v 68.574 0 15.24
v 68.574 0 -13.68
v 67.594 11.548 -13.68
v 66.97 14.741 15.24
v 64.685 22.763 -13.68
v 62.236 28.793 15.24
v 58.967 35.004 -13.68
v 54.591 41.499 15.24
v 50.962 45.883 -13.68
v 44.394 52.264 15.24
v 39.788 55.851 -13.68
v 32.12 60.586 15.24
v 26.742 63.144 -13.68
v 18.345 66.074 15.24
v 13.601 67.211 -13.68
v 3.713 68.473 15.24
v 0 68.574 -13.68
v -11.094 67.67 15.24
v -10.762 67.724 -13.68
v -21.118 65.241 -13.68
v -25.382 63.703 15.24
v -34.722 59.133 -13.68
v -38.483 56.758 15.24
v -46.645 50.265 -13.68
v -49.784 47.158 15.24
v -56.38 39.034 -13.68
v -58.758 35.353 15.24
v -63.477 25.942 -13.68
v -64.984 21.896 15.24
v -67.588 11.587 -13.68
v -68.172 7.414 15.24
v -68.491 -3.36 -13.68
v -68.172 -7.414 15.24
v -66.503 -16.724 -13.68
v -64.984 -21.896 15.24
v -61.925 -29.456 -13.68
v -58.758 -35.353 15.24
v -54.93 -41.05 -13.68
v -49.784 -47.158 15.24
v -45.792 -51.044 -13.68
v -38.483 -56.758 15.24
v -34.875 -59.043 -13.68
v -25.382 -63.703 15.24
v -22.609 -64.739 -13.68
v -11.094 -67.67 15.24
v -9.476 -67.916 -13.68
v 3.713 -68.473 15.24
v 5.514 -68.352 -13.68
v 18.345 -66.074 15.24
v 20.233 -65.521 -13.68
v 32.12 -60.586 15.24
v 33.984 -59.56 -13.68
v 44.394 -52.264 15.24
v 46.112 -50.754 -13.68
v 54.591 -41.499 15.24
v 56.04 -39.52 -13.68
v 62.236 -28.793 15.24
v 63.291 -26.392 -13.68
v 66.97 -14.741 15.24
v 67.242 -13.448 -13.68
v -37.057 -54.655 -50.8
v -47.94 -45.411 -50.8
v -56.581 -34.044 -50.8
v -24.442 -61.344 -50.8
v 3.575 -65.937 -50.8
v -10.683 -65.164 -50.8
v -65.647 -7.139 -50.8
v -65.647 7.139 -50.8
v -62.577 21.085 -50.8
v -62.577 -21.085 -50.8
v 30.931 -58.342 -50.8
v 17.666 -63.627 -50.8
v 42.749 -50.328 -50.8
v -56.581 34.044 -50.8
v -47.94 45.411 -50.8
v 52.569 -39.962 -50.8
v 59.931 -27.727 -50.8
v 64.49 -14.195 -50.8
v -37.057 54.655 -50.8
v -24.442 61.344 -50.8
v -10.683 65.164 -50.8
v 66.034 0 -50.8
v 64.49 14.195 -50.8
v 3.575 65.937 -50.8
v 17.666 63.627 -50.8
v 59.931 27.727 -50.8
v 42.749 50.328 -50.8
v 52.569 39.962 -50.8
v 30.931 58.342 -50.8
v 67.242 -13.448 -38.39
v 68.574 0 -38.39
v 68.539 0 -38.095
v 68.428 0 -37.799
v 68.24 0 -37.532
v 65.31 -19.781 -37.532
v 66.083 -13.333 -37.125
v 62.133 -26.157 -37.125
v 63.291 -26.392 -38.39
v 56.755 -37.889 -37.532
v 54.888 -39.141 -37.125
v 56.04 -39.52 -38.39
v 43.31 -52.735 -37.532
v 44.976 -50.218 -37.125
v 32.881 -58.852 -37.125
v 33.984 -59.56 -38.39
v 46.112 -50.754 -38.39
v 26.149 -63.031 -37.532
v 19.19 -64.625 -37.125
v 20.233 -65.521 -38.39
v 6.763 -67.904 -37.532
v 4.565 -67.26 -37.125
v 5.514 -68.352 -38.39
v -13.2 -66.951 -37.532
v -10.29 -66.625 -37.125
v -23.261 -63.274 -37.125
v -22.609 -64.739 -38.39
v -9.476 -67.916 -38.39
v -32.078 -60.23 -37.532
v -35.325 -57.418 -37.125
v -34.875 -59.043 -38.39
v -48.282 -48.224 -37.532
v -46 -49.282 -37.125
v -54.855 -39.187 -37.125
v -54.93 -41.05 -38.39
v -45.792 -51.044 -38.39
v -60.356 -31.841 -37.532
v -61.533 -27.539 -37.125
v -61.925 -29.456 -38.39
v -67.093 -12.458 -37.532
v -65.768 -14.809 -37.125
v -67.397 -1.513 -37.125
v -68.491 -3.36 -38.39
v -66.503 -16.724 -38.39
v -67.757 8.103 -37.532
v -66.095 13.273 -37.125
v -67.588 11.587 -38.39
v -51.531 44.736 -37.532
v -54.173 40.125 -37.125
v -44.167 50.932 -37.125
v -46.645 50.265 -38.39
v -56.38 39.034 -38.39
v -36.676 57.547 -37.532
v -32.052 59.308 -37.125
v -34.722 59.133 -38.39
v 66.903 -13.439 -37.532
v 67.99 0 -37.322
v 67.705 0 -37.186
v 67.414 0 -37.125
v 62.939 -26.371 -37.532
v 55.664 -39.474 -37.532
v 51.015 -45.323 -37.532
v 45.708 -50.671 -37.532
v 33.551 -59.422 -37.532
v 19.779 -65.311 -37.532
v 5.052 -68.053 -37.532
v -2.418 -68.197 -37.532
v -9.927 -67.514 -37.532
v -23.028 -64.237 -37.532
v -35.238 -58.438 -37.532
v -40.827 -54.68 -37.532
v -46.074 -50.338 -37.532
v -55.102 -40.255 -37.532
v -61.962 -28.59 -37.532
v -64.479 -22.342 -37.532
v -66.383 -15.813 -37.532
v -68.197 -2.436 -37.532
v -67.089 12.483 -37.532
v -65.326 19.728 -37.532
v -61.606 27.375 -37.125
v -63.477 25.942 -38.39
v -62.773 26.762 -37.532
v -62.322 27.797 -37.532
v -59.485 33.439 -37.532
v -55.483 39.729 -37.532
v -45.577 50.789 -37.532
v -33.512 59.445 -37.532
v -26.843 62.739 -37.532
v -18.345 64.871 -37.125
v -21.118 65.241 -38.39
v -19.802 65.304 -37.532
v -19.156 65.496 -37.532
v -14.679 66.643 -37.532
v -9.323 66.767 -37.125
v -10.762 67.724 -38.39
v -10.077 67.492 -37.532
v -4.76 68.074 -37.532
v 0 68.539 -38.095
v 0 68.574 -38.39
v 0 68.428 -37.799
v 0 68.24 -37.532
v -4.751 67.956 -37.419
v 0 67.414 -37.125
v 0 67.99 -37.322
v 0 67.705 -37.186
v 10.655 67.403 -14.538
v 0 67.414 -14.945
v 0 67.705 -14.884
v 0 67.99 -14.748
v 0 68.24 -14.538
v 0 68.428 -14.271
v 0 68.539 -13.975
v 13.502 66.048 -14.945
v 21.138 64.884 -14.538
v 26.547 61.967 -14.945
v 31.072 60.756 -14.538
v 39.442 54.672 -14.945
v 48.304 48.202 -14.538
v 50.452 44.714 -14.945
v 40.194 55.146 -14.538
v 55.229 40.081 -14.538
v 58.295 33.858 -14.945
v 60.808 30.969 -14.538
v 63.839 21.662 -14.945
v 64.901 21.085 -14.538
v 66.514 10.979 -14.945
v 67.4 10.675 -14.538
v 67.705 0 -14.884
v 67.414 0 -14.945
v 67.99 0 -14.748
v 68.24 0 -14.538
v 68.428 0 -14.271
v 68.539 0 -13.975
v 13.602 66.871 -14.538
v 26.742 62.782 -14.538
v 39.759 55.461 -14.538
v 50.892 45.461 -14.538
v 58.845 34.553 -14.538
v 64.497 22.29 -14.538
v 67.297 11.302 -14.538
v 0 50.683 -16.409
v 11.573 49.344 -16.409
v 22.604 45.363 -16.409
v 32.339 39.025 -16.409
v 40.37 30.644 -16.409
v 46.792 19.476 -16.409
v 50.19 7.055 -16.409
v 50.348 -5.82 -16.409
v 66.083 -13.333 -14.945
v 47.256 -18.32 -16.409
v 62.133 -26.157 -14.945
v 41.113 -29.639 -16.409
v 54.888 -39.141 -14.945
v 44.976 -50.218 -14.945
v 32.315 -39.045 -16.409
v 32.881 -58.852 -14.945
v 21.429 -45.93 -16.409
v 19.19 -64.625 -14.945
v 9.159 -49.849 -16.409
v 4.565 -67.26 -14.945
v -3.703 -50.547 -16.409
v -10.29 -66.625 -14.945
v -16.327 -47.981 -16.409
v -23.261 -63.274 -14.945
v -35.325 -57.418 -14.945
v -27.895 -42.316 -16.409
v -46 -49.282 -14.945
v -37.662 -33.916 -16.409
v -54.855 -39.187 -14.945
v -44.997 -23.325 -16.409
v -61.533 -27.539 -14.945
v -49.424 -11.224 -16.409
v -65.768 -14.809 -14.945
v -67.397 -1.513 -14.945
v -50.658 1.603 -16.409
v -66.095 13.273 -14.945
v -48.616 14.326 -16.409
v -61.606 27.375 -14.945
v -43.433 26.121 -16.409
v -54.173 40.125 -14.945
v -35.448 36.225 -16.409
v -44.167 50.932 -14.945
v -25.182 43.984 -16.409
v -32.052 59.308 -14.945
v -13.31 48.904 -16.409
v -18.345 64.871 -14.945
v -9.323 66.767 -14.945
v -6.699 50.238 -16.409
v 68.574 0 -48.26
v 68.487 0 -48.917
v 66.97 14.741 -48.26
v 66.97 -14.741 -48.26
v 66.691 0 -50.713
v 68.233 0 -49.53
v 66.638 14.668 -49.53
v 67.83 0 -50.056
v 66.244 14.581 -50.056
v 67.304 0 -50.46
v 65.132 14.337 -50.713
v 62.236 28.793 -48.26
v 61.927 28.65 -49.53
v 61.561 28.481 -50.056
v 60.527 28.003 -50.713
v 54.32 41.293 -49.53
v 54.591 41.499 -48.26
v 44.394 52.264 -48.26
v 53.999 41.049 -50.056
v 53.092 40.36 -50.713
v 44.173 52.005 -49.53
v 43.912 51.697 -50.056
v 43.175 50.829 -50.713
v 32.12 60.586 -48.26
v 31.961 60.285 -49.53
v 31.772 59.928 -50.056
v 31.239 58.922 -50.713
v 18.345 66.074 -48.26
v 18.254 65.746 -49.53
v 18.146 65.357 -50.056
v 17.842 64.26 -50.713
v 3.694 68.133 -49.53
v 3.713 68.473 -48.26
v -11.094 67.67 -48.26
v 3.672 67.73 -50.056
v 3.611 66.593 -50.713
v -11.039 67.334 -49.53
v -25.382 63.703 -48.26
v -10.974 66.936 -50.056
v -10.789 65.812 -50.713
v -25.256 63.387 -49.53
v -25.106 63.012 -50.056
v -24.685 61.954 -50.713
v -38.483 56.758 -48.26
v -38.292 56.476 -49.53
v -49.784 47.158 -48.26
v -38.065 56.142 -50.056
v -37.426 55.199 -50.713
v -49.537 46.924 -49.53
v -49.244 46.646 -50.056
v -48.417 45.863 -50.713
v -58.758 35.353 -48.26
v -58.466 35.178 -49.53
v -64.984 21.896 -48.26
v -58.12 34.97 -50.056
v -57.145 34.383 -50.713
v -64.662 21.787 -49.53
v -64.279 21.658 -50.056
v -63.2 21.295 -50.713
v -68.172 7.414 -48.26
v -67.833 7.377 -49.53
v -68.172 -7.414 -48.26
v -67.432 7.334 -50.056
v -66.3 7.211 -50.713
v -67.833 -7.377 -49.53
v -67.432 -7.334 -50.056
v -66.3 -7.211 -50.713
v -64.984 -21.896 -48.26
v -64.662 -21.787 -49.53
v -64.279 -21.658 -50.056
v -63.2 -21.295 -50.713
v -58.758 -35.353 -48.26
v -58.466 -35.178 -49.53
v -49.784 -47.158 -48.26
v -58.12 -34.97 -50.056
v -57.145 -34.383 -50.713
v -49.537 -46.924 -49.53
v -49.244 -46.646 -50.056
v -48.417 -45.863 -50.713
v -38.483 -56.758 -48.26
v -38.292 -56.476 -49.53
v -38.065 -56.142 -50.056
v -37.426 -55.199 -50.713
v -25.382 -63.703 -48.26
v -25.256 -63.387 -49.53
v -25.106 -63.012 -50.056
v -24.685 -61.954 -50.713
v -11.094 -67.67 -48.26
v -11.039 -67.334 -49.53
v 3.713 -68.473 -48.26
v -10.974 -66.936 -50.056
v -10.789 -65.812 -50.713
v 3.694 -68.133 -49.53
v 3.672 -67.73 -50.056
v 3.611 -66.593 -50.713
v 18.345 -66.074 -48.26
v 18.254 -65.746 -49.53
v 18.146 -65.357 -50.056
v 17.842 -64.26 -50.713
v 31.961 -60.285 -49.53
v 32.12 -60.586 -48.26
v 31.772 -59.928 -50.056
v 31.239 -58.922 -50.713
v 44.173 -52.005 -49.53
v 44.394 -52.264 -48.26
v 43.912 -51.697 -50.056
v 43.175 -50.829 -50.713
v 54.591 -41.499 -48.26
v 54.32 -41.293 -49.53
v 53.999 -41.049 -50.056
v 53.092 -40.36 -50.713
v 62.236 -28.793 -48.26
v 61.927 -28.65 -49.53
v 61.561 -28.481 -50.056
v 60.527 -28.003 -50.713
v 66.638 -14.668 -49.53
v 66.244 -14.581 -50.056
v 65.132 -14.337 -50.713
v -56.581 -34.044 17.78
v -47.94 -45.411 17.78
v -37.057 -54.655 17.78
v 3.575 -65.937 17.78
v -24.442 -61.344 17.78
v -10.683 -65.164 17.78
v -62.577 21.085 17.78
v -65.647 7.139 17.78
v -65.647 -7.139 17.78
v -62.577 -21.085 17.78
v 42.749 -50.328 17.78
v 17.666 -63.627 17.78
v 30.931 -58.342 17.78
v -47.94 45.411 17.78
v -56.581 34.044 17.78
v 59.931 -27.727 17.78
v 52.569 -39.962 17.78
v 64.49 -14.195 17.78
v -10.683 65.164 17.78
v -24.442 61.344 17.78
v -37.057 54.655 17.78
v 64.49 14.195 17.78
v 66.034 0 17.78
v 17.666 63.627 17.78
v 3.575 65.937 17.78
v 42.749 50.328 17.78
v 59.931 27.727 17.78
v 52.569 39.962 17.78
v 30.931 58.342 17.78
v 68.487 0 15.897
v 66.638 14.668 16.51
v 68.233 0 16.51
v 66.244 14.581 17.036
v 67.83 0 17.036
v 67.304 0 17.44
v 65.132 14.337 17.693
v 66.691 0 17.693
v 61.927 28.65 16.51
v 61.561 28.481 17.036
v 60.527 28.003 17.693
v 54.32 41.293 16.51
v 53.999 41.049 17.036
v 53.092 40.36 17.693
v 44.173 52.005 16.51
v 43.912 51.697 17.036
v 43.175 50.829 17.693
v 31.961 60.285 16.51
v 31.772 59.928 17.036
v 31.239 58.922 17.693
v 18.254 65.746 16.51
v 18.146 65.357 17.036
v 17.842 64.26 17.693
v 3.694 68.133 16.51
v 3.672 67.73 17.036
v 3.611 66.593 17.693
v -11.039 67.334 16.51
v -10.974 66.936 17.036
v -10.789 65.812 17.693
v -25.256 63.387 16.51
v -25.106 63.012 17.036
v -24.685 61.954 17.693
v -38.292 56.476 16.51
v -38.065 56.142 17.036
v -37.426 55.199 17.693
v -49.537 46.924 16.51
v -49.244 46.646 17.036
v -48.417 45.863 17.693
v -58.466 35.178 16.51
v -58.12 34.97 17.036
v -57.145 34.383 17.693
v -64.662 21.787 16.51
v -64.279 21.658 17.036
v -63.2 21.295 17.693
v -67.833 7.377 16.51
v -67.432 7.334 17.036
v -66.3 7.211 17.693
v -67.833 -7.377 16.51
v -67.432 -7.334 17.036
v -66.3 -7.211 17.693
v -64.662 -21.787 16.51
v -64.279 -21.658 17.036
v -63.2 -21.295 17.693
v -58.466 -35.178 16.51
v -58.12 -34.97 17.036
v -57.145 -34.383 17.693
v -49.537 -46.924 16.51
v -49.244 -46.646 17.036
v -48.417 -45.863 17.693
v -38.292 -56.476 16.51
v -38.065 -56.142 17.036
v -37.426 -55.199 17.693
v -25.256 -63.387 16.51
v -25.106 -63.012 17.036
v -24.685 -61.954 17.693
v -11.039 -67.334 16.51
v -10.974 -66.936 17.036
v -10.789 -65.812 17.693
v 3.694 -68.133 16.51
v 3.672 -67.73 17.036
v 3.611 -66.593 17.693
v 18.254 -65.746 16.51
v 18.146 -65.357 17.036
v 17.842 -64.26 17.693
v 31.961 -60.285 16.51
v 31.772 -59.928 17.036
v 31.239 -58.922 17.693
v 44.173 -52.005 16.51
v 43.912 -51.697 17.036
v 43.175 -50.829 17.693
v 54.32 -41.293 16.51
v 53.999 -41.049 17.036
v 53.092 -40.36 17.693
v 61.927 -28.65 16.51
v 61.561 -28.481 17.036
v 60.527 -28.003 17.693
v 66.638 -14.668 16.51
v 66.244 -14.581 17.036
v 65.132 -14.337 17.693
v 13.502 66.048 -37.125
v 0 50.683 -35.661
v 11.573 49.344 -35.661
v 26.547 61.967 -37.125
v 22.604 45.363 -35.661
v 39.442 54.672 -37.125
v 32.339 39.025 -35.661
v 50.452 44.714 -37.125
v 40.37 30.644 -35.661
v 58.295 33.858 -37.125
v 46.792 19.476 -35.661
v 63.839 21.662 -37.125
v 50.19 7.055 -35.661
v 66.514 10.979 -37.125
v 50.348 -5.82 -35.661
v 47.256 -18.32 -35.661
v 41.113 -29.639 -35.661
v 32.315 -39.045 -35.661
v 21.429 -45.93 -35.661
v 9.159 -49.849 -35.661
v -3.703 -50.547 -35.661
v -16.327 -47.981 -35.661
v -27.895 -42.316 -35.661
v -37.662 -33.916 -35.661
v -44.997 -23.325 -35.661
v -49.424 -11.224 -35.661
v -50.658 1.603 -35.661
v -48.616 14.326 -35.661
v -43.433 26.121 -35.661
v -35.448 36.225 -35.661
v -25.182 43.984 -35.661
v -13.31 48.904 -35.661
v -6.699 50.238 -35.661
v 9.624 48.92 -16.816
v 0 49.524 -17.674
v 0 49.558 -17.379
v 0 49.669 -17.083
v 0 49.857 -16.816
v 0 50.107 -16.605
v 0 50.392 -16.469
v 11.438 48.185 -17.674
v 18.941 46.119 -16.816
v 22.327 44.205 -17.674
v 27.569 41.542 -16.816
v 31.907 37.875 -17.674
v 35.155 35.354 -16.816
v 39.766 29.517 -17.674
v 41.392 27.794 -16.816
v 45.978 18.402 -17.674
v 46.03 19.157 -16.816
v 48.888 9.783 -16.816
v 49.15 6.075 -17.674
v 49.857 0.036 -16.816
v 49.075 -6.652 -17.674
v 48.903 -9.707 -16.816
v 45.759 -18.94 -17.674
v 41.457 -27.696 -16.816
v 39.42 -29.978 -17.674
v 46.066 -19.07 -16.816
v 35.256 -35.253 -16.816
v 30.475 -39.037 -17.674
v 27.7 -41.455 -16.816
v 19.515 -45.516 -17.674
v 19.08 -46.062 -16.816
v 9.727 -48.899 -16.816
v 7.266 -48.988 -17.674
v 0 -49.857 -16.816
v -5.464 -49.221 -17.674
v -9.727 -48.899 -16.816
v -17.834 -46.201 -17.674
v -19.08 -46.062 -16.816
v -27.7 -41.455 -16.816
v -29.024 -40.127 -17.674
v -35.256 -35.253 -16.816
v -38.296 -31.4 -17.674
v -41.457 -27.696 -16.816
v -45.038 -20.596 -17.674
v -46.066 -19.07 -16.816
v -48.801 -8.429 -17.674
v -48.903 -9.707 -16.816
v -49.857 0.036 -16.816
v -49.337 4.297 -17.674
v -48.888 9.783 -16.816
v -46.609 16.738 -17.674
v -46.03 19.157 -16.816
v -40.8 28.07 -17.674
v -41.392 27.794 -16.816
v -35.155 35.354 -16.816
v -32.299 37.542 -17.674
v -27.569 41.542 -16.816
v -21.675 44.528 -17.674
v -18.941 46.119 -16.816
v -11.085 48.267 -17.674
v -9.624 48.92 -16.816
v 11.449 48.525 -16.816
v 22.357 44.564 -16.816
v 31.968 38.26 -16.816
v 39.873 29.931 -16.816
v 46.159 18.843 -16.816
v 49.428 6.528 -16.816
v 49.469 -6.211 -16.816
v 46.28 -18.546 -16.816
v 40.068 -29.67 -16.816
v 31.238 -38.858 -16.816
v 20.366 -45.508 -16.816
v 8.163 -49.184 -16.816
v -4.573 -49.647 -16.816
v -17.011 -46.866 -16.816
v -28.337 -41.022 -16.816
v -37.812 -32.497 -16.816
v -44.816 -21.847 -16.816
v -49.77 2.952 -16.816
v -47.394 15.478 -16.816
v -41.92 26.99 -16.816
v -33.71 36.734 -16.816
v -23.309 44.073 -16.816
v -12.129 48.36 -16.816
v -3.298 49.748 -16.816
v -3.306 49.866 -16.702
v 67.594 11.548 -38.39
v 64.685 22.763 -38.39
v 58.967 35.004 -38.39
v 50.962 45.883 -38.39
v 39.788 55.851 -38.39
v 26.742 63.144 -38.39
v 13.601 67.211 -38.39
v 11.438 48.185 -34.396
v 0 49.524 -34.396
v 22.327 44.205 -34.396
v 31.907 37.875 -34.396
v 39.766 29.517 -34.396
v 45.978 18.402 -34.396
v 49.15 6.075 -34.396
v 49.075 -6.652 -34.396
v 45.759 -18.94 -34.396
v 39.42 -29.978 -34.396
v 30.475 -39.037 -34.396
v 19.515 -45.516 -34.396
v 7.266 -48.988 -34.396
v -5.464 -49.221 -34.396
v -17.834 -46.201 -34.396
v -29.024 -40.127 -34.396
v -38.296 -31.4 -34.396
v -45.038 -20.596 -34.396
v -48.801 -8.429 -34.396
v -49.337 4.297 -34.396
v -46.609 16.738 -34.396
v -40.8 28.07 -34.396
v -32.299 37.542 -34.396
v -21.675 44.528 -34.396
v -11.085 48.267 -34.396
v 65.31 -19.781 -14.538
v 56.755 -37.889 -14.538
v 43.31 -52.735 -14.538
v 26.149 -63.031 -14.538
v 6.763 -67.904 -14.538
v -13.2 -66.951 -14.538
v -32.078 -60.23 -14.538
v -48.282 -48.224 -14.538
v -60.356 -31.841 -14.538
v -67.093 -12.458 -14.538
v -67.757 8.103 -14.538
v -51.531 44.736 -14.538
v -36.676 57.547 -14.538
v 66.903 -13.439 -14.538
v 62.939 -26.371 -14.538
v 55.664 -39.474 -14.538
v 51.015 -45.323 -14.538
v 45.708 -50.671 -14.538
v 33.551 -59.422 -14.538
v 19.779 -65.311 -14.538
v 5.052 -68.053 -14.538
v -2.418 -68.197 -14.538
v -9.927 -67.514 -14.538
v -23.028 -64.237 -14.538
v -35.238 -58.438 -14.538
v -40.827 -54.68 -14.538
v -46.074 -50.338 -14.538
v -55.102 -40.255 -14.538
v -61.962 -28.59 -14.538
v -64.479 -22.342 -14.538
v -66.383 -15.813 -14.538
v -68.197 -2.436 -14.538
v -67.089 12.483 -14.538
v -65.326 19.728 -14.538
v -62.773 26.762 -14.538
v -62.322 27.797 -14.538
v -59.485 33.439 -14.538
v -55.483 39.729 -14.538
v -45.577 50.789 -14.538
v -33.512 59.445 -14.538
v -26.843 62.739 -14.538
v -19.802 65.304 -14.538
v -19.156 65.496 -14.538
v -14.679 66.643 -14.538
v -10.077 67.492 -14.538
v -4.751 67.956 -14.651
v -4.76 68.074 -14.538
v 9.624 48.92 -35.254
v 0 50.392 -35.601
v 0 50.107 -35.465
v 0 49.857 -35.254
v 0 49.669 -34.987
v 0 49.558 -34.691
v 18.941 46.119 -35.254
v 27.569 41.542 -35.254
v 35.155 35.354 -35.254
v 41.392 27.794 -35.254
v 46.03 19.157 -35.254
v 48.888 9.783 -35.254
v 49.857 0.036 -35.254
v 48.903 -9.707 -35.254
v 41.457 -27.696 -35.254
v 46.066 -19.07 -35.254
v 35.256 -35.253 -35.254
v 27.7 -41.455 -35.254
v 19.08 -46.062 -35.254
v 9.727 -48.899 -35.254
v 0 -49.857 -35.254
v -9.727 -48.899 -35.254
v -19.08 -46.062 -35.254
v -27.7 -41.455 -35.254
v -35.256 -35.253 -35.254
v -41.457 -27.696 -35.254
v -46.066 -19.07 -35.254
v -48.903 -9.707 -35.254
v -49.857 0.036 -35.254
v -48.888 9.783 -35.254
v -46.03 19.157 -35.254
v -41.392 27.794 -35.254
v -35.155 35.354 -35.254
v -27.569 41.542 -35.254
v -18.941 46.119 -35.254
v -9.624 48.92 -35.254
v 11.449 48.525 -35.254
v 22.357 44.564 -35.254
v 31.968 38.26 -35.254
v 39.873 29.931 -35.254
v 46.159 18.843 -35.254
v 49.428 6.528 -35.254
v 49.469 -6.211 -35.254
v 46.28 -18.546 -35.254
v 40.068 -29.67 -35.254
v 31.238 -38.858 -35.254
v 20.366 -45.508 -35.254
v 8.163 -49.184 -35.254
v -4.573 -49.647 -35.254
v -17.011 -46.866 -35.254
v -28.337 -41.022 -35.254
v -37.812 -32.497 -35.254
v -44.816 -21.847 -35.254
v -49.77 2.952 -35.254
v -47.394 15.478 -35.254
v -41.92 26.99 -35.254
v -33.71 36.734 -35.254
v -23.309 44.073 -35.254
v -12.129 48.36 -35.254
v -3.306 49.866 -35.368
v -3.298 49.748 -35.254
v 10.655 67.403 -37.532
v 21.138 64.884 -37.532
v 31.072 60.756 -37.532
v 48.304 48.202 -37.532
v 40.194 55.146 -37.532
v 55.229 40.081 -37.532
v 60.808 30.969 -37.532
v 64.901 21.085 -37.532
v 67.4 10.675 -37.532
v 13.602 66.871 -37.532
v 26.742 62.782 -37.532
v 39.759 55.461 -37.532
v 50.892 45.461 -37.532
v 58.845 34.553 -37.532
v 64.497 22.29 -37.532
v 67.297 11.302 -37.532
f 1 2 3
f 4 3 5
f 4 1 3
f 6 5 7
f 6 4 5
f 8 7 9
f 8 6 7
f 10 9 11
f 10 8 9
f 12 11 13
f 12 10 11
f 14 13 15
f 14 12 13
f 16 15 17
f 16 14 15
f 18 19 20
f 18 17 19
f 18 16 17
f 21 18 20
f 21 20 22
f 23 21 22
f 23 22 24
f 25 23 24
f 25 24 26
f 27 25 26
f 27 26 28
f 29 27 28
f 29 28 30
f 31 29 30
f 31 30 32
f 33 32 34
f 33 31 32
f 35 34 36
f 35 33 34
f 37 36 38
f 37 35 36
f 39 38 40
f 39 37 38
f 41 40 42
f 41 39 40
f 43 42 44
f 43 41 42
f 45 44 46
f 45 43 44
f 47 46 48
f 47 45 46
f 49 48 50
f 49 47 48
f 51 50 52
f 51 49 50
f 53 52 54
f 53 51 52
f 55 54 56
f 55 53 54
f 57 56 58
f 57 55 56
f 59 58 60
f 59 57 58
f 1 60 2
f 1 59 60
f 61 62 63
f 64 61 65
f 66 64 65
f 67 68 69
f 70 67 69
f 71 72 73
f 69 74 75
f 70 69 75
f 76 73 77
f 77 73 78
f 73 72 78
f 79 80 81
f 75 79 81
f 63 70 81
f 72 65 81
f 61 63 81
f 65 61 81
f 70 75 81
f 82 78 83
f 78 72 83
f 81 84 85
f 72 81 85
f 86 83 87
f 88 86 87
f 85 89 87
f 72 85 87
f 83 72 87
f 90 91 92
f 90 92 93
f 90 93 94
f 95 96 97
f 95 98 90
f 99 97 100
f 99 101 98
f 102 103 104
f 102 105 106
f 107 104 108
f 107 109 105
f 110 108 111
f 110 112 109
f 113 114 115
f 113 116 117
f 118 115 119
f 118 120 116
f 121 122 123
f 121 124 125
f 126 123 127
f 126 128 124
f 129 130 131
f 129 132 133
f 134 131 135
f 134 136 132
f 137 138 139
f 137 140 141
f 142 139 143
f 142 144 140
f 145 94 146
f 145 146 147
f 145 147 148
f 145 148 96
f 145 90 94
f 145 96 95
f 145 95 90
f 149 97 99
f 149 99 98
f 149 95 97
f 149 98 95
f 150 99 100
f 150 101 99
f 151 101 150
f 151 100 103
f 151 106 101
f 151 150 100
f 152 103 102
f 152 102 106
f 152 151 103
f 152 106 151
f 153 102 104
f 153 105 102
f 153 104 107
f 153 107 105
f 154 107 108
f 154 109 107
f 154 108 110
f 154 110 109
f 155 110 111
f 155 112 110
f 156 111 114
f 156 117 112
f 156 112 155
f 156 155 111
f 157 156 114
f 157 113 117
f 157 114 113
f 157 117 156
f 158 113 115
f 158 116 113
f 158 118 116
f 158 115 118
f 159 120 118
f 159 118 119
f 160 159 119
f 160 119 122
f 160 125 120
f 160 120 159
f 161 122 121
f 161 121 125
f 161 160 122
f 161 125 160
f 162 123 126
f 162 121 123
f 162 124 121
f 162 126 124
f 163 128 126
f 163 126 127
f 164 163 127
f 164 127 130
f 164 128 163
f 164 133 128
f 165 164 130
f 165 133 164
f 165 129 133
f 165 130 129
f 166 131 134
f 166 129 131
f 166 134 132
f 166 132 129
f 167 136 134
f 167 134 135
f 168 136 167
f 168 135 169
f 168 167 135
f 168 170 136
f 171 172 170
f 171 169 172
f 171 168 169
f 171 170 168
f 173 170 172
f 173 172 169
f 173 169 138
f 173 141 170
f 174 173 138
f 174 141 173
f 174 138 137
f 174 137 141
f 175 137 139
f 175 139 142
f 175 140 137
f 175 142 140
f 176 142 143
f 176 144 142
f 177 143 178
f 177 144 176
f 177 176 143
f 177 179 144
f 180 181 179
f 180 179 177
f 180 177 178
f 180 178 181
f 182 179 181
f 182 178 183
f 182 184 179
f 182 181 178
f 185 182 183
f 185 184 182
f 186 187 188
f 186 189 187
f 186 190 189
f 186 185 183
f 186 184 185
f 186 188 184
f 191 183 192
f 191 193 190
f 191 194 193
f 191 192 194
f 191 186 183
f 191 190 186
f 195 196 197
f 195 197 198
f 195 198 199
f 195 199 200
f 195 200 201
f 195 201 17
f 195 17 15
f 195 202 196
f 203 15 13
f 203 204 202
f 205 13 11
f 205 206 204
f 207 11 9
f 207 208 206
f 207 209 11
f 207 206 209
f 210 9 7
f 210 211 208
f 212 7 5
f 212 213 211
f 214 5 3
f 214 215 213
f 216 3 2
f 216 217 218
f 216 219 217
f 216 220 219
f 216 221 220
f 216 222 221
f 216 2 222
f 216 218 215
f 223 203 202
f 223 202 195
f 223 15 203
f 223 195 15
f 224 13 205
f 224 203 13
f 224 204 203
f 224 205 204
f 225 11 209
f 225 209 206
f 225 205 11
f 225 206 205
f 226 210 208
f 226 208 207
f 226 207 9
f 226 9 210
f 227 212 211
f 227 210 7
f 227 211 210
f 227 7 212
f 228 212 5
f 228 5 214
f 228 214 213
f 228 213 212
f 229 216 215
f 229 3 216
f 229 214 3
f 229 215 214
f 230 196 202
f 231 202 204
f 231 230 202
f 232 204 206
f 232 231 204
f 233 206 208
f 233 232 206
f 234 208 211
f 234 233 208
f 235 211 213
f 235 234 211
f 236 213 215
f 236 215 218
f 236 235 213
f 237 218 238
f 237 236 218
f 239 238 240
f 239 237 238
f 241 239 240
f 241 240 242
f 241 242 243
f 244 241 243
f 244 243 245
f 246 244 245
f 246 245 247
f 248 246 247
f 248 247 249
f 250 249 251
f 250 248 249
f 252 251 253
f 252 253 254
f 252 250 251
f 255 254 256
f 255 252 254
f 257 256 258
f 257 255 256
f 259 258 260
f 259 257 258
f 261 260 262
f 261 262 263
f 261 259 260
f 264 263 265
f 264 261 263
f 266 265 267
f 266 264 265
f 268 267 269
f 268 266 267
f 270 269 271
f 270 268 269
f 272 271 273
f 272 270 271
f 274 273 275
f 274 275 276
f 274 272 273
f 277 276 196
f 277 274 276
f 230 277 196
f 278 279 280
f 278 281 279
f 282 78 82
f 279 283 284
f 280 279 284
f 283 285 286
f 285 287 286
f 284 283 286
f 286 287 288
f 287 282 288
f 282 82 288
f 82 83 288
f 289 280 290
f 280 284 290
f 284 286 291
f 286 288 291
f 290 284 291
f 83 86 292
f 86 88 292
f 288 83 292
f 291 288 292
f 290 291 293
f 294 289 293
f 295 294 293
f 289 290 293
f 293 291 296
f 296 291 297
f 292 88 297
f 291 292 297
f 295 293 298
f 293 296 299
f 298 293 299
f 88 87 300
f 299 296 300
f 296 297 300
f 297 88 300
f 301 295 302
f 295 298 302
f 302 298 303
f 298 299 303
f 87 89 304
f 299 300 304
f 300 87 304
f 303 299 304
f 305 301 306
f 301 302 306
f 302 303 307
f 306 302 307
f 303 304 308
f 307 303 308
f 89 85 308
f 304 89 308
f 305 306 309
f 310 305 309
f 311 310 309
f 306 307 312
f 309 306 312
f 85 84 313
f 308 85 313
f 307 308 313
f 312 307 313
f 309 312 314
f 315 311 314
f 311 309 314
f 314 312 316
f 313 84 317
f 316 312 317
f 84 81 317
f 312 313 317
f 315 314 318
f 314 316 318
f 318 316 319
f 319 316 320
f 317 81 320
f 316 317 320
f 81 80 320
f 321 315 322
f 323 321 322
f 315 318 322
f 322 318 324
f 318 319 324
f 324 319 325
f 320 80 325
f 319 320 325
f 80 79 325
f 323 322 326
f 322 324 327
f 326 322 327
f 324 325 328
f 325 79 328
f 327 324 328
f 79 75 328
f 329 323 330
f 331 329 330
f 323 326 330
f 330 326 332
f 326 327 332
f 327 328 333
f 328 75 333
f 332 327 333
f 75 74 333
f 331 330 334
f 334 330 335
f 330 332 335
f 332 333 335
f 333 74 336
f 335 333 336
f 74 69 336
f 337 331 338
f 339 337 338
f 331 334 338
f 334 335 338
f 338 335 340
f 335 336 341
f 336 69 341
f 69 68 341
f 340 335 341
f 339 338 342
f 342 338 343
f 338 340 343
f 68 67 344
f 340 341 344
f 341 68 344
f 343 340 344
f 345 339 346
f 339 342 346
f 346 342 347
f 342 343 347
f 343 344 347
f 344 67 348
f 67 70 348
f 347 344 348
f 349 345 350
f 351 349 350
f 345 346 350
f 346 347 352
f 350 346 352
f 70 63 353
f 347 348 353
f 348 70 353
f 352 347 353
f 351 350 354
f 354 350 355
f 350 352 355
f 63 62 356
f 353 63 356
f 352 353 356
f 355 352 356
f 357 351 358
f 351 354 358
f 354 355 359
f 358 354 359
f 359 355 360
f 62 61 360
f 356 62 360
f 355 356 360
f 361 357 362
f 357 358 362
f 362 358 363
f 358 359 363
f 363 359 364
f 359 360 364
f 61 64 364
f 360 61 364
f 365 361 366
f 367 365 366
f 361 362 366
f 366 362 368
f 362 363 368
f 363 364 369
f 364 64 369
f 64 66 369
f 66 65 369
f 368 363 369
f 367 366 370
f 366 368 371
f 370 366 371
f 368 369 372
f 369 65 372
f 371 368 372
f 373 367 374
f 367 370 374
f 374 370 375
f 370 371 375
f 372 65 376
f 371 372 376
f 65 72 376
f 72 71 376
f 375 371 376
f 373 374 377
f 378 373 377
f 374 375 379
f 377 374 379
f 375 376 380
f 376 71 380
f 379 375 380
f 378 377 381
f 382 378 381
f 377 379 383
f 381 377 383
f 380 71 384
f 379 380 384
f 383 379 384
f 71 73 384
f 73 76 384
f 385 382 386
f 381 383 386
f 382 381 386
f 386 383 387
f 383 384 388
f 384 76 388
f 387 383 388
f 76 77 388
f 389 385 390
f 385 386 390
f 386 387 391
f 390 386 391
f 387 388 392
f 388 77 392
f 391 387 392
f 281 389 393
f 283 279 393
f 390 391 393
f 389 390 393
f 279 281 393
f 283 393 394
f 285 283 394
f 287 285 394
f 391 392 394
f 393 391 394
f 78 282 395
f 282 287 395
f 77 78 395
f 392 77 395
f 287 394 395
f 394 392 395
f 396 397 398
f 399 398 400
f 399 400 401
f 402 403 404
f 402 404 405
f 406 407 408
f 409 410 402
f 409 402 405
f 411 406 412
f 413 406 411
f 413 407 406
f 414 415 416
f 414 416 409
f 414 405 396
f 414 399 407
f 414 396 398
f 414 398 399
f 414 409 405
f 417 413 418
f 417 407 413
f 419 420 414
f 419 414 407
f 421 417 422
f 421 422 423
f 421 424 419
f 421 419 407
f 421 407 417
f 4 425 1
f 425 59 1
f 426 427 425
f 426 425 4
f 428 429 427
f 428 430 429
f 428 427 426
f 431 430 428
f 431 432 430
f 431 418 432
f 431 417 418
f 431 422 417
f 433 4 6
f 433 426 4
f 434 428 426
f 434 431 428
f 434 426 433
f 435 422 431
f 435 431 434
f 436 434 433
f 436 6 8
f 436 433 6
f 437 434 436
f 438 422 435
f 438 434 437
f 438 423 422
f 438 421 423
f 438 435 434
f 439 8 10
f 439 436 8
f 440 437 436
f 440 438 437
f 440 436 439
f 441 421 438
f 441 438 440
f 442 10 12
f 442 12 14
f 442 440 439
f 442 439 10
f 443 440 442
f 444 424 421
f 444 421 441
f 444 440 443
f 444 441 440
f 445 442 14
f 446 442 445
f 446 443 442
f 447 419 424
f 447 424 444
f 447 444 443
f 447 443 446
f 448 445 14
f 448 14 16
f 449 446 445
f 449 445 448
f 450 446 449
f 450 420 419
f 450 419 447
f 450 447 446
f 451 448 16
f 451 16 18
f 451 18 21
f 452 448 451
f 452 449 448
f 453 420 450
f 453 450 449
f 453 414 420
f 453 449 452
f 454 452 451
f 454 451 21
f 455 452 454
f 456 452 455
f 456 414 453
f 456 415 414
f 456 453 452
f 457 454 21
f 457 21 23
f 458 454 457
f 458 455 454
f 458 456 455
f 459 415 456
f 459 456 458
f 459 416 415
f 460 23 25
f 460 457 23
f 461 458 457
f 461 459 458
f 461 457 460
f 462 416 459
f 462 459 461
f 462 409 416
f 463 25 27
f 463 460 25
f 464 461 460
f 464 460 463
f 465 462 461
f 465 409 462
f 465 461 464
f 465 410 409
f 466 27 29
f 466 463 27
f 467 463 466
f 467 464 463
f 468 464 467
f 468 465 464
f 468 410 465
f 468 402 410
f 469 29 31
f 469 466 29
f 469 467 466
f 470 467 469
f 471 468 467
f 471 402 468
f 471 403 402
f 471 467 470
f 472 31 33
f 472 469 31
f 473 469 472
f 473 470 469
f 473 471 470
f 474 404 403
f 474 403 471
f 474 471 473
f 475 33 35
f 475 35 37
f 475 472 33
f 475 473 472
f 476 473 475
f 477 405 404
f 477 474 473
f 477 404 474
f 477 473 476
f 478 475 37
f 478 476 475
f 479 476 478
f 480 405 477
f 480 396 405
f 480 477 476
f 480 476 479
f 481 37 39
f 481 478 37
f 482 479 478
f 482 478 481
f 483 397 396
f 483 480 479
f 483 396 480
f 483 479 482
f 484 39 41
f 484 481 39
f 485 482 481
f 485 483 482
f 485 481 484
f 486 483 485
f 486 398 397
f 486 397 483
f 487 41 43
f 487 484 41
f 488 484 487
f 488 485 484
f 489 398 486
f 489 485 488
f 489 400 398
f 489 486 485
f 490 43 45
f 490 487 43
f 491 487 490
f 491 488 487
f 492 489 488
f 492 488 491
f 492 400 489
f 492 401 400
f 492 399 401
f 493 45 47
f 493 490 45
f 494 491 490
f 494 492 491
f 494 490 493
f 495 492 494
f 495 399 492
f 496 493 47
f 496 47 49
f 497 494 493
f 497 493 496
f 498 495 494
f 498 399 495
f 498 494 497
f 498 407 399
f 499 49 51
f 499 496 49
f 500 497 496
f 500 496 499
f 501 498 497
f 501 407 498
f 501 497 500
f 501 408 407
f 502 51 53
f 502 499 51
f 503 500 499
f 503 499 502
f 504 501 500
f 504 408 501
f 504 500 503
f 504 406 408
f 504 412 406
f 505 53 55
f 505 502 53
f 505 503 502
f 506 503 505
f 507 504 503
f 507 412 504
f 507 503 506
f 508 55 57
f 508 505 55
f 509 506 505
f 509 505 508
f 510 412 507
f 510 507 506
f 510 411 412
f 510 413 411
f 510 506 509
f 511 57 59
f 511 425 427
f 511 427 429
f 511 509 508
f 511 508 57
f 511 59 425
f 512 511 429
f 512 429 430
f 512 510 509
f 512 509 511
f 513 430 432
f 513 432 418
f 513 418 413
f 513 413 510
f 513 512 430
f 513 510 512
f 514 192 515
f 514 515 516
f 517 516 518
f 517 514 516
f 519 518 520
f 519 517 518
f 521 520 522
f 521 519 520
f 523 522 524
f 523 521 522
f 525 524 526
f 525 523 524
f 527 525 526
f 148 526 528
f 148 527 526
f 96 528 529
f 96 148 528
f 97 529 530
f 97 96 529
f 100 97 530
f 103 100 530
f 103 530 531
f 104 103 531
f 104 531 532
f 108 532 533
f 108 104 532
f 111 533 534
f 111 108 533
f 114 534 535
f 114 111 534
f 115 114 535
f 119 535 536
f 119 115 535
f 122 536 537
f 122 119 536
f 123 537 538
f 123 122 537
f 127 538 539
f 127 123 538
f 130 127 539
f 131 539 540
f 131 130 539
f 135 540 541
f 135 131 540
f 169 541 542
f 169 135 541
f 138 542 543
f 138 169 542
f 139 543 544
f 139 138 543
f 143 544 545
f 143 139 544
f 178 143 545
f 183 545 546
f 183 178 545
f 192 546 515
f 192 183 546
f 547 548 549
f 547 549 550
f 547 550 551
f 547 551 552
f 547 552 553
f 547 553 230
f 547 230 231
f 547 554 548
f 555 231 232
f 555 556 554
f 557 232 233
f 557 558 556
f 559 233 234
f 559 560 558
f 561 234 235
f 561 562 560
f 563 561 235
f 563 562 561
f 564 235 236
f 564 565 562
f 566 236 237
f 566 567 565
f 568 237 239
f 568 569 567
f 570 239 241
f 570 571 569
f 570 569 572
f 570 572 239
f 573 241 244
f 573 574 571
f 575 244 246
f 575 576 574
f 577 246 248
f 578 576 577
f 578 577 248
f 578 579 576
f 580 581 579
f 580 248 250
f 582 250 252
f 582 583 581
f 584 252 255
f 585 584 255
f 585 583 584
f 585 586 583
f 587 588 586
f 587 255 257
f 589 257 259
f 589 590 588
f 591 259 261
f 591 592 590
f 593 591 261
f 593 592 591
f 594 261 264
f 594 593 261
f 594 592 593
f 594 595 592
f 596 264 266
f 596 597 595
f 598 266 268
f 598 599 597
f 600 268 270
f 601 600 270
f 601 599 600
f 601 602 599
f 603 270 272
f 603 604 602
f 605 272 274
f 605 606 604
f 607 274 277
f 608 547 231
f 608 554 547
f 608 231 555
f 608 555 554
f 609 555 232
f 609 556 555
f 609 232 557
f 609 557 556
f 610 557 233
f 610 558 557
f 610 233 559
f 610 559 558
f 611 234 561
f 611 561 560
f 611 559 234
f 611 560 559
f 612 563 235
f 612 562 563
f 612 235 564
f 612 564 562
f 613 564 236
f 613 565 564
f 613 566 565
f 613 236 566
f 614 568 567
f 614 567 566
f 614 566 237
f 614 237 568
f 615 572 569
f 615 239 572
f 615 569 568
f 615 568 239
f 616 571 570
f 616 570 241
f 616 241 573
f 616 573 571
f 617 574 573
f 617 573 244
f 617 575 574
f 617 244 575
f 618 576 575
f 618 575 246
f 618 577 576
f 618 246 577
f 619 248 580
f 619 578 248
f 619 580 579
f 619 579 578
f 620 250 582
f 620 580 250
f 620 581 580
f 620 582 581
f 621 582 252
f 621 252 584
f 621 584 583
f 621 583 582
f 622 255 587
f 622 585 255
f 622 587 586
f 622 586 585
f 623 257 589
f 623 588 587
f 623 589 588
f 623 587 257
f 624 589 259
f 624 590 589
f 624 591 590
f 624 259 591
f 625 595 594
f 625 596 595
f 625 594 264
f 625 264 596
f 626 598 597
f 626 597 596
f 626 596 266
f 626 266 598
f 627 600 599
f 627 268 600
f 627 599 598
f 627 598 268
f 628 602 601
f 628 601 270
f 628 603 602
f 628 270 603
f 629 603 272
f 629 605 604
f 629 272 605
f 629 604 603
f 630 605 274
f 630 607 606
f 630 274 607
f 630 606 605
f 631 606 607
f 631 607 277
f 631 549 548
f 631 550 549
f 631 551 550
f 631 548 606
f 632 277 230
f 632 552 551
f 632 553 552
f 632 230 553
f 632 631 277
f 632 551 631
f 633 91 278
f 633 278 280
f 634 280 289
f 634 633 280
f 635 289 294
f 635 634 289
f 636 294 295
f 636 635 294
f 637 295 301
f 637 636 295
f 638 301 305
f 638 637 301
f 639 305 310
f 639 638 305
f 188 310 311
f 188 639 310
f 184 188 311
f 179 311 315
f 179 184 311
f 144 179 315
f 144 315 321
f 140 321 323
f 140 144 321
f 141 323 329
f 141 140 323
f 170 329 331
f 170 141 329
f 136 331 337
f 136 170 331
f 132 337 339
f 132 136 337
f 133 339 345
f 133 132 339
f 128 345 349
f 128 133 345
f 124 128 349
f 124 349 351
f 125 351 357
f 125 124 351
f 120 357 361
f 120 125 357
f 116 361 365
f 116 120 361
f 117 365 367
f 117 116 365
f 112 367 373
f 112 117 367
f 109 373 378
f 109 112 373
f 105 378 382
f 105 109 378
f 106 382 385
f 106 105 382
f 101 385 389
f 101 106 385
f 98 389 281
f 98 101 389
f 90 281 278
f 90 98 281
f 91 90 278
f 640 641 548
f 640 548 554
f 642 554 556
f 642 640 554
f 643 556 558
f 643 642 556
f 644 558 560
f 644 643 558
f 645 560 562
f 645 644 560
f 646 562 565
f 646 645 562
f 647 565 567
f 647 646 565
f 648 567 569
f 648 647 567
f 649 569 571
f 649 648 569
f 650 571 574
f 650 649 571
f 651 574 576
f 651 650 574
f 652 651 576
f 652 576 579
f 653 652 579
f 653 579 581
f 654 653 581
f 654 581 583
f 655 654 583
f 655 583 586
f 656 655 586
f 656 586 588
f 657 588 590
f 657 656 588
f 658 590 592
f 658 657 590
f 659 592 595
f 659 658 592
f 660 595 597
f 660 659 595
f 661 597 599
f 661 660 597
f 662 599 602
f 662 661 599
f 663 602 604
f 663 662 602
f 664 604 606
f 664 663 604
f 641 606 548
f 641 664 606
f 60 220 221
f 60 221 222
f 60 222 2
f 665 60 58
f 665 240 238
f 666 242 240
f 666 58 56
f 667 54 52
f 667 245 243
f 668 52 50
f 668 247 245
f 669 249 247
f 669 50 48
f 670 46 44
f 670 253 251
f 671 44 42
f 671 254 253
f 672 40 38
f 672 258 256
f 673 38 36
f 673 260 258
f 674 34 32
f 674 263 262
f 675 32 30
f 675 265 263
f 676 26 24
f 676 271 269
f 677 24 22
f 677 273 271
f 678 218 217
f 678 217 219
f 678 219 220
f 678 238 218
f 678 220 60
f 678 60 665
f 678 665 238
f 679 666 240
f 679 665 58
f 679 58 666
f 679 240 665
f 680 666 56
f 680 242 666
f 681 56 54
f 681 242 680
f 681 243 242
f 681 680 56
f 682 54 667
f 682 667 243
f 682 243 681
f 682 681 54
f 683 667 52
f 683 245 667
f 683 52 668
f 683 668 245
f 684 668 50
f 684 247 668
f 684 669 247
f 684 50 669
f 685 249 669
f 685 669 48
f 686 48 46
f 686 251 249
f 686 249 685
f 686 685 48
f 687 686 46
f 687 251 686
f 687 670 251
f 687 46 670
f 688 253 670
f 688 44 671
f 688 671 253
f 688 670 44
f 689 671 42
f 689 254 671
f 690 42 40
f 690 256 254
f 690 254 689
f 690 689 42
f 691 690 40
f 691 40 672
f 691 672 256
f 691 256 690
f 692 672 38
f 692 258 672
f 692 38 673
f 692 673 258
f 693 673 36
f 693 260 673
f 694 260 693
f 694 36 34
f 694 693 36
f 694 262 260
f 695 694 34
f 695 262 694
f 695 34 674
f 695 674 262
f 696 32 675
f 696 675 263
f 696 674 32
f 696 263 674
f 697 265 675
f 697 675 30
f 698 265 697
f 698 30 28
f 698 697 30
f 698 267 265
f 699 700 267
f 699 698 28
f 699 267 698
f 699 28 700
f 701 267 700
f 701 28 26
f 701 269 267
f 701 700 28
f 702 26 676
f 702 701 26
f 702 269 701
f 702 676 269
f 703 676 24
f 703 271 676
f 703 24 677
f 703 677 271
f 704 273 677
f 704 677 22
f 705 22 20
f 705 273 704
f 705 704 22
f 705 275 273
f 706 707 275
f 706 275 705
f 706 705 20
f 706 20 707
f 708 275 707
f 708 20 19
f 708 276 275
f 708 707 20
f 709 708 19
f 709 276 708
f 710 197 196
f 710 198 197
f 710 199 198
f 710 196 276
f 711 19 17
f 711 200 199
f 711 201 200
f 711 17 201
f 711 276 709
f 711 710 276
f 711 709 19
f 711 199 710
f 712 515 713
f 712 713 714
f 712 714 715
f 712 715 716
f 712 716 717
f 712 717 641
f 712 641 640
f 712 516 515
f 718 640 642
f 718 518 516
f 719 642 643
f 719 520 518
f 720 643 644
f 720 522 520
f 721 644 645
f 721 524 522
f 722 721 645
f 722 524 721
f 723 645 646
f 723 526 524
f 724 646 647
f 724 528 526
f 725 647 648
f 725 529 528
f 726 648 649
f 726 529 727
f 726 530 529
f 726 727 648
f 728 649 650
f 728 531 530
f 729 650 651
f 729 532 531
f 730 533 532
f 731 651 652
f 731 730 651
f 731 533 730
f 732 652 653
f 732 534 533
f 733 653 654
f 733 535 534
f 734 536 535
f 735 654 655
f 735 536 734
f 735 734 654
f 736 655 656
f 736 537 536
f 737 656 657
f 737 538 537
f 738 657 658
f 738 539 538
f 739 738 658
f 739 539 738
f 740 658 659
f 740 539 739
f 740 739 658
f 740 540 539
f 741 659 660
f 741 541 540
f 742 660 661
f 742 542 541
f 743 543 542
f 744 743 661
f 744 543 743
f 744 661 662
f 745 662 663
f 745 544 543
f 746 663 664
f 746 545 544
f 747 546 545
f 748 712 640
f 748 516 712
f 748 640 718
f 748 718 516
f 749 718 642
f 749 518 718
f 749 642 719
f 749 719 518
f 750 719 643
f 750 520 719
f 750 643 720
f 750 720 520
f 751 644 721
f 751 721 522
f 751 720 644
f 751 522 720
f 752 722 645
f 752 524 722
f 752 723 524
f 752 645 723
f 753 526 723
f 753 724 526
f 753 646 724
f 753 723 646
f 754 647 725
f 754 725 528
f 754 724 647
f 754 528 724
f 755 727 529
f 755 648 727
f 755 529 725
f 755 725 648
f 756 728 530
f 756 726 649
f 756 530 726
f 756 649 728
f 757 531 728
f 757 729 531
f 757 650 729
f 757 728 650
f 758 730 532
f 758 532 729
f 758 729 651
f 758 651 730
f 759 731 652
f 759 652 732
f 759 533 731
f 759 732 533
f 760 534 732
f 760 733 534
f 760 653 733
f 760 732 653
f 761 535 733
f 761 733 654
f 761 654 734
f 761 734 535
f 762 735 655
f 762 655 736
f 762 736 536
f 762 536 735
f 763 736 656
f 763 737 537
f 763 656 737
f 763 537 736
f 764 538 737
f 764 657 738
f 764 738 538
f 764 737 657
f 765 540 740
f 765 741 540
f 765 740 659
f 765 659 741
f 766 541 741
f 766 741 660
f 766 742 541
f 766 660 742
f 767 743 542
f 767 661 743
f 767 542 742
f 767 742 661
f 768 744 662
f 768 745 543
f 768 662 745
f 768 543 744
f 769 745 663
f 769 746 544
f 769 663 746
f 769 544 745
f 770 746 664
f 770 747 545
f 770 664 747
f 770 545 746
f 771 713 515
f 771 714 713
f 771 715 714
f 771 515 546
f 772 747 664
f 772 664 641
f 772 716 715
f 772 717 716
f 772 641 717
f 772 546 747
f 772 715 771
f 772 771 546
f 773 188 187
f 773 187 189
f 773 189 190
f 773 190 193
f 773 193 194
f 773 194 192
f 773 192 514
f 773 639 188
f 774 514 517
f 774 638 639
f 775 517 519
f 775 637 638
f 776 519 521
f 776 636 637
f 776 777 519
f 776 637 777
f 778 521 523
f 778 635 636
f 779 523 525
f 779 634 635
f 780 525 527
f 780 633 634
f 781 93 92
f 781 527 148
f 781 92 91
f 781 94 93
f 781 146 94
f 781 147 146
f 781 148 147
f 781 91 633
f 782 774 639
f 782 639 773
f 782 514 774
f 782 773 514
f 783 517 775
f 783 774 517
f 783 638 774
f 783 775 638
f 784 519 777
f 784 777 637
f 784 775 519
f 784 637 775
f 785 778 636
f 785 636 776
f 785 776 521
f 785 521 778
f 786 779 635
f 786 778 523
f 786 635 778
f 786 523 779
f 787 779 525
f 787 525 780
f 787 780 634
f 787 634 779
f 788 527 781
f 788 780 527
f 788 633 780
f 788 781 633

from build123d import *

# Parameters (mm, degrees)
SKETCH1_R                = 68.57365
BOSS_EXTRUDE1_DEPTH      = 17.78
BOSS_EXTRUDE1_DEPTH_BACK = 50.8
FILLET1_R                = 1.27
FILLET2_R                = 2.54


with BuildPart() as part:
    # Sketch1 → Boss-Extrude1 (new body, two sides)
    with BuildSketch(Plane.XY) as boss_extrude1_sk:
        Circle(SKETCH1_R)
    extrude(amount=BOSS_EXTRUDE1_DEPTH)
    extrude(boss_extrude1_sk.sketch, amount=-BOSS_EXTRUDE1_DEPTH_BACK)

    # Sketch2 → Cut-Revolve1 (revolve, cut)
    with BuildSketch(Plane(origin=(0, 0, 0), x_dir=(0, 0, -1), z_dir=(1, 0, 0))):
        Polygon((16.51, 49.52365), (35.56, 49.52365), (37.22665904, 68.57365), (14.84334096, 68.57365), align=None)
    revolve(axis=Axis((0, 0, 17.78), (0, 0, -1)), mode=Mode.SUBTRACT)

    # Fillet1
    fillet1_edges = [part.edges().sort_by_distance(p)[0] for p in [
        (-48.488892926, -48.488892926, -14.84334096),
        (-48.488892926, -48.488892926, -37.22665904),
        (0, -49.52365, -35.56),
        (0, -49.52365, -16.51),
    ]]
    fillet(fillet1_edges, radius=FILLET1_R)

    # Fillet2
    fillet2_edges = [part.edges().sort_by_distance(p)[0] for p in [
        (-68.57365, 0, 17.78),
        (-68.57365, 0, -50.8),
    ]]
    fillet(fillet2_edges, radius=FILLET2_R)


solid = part.part
